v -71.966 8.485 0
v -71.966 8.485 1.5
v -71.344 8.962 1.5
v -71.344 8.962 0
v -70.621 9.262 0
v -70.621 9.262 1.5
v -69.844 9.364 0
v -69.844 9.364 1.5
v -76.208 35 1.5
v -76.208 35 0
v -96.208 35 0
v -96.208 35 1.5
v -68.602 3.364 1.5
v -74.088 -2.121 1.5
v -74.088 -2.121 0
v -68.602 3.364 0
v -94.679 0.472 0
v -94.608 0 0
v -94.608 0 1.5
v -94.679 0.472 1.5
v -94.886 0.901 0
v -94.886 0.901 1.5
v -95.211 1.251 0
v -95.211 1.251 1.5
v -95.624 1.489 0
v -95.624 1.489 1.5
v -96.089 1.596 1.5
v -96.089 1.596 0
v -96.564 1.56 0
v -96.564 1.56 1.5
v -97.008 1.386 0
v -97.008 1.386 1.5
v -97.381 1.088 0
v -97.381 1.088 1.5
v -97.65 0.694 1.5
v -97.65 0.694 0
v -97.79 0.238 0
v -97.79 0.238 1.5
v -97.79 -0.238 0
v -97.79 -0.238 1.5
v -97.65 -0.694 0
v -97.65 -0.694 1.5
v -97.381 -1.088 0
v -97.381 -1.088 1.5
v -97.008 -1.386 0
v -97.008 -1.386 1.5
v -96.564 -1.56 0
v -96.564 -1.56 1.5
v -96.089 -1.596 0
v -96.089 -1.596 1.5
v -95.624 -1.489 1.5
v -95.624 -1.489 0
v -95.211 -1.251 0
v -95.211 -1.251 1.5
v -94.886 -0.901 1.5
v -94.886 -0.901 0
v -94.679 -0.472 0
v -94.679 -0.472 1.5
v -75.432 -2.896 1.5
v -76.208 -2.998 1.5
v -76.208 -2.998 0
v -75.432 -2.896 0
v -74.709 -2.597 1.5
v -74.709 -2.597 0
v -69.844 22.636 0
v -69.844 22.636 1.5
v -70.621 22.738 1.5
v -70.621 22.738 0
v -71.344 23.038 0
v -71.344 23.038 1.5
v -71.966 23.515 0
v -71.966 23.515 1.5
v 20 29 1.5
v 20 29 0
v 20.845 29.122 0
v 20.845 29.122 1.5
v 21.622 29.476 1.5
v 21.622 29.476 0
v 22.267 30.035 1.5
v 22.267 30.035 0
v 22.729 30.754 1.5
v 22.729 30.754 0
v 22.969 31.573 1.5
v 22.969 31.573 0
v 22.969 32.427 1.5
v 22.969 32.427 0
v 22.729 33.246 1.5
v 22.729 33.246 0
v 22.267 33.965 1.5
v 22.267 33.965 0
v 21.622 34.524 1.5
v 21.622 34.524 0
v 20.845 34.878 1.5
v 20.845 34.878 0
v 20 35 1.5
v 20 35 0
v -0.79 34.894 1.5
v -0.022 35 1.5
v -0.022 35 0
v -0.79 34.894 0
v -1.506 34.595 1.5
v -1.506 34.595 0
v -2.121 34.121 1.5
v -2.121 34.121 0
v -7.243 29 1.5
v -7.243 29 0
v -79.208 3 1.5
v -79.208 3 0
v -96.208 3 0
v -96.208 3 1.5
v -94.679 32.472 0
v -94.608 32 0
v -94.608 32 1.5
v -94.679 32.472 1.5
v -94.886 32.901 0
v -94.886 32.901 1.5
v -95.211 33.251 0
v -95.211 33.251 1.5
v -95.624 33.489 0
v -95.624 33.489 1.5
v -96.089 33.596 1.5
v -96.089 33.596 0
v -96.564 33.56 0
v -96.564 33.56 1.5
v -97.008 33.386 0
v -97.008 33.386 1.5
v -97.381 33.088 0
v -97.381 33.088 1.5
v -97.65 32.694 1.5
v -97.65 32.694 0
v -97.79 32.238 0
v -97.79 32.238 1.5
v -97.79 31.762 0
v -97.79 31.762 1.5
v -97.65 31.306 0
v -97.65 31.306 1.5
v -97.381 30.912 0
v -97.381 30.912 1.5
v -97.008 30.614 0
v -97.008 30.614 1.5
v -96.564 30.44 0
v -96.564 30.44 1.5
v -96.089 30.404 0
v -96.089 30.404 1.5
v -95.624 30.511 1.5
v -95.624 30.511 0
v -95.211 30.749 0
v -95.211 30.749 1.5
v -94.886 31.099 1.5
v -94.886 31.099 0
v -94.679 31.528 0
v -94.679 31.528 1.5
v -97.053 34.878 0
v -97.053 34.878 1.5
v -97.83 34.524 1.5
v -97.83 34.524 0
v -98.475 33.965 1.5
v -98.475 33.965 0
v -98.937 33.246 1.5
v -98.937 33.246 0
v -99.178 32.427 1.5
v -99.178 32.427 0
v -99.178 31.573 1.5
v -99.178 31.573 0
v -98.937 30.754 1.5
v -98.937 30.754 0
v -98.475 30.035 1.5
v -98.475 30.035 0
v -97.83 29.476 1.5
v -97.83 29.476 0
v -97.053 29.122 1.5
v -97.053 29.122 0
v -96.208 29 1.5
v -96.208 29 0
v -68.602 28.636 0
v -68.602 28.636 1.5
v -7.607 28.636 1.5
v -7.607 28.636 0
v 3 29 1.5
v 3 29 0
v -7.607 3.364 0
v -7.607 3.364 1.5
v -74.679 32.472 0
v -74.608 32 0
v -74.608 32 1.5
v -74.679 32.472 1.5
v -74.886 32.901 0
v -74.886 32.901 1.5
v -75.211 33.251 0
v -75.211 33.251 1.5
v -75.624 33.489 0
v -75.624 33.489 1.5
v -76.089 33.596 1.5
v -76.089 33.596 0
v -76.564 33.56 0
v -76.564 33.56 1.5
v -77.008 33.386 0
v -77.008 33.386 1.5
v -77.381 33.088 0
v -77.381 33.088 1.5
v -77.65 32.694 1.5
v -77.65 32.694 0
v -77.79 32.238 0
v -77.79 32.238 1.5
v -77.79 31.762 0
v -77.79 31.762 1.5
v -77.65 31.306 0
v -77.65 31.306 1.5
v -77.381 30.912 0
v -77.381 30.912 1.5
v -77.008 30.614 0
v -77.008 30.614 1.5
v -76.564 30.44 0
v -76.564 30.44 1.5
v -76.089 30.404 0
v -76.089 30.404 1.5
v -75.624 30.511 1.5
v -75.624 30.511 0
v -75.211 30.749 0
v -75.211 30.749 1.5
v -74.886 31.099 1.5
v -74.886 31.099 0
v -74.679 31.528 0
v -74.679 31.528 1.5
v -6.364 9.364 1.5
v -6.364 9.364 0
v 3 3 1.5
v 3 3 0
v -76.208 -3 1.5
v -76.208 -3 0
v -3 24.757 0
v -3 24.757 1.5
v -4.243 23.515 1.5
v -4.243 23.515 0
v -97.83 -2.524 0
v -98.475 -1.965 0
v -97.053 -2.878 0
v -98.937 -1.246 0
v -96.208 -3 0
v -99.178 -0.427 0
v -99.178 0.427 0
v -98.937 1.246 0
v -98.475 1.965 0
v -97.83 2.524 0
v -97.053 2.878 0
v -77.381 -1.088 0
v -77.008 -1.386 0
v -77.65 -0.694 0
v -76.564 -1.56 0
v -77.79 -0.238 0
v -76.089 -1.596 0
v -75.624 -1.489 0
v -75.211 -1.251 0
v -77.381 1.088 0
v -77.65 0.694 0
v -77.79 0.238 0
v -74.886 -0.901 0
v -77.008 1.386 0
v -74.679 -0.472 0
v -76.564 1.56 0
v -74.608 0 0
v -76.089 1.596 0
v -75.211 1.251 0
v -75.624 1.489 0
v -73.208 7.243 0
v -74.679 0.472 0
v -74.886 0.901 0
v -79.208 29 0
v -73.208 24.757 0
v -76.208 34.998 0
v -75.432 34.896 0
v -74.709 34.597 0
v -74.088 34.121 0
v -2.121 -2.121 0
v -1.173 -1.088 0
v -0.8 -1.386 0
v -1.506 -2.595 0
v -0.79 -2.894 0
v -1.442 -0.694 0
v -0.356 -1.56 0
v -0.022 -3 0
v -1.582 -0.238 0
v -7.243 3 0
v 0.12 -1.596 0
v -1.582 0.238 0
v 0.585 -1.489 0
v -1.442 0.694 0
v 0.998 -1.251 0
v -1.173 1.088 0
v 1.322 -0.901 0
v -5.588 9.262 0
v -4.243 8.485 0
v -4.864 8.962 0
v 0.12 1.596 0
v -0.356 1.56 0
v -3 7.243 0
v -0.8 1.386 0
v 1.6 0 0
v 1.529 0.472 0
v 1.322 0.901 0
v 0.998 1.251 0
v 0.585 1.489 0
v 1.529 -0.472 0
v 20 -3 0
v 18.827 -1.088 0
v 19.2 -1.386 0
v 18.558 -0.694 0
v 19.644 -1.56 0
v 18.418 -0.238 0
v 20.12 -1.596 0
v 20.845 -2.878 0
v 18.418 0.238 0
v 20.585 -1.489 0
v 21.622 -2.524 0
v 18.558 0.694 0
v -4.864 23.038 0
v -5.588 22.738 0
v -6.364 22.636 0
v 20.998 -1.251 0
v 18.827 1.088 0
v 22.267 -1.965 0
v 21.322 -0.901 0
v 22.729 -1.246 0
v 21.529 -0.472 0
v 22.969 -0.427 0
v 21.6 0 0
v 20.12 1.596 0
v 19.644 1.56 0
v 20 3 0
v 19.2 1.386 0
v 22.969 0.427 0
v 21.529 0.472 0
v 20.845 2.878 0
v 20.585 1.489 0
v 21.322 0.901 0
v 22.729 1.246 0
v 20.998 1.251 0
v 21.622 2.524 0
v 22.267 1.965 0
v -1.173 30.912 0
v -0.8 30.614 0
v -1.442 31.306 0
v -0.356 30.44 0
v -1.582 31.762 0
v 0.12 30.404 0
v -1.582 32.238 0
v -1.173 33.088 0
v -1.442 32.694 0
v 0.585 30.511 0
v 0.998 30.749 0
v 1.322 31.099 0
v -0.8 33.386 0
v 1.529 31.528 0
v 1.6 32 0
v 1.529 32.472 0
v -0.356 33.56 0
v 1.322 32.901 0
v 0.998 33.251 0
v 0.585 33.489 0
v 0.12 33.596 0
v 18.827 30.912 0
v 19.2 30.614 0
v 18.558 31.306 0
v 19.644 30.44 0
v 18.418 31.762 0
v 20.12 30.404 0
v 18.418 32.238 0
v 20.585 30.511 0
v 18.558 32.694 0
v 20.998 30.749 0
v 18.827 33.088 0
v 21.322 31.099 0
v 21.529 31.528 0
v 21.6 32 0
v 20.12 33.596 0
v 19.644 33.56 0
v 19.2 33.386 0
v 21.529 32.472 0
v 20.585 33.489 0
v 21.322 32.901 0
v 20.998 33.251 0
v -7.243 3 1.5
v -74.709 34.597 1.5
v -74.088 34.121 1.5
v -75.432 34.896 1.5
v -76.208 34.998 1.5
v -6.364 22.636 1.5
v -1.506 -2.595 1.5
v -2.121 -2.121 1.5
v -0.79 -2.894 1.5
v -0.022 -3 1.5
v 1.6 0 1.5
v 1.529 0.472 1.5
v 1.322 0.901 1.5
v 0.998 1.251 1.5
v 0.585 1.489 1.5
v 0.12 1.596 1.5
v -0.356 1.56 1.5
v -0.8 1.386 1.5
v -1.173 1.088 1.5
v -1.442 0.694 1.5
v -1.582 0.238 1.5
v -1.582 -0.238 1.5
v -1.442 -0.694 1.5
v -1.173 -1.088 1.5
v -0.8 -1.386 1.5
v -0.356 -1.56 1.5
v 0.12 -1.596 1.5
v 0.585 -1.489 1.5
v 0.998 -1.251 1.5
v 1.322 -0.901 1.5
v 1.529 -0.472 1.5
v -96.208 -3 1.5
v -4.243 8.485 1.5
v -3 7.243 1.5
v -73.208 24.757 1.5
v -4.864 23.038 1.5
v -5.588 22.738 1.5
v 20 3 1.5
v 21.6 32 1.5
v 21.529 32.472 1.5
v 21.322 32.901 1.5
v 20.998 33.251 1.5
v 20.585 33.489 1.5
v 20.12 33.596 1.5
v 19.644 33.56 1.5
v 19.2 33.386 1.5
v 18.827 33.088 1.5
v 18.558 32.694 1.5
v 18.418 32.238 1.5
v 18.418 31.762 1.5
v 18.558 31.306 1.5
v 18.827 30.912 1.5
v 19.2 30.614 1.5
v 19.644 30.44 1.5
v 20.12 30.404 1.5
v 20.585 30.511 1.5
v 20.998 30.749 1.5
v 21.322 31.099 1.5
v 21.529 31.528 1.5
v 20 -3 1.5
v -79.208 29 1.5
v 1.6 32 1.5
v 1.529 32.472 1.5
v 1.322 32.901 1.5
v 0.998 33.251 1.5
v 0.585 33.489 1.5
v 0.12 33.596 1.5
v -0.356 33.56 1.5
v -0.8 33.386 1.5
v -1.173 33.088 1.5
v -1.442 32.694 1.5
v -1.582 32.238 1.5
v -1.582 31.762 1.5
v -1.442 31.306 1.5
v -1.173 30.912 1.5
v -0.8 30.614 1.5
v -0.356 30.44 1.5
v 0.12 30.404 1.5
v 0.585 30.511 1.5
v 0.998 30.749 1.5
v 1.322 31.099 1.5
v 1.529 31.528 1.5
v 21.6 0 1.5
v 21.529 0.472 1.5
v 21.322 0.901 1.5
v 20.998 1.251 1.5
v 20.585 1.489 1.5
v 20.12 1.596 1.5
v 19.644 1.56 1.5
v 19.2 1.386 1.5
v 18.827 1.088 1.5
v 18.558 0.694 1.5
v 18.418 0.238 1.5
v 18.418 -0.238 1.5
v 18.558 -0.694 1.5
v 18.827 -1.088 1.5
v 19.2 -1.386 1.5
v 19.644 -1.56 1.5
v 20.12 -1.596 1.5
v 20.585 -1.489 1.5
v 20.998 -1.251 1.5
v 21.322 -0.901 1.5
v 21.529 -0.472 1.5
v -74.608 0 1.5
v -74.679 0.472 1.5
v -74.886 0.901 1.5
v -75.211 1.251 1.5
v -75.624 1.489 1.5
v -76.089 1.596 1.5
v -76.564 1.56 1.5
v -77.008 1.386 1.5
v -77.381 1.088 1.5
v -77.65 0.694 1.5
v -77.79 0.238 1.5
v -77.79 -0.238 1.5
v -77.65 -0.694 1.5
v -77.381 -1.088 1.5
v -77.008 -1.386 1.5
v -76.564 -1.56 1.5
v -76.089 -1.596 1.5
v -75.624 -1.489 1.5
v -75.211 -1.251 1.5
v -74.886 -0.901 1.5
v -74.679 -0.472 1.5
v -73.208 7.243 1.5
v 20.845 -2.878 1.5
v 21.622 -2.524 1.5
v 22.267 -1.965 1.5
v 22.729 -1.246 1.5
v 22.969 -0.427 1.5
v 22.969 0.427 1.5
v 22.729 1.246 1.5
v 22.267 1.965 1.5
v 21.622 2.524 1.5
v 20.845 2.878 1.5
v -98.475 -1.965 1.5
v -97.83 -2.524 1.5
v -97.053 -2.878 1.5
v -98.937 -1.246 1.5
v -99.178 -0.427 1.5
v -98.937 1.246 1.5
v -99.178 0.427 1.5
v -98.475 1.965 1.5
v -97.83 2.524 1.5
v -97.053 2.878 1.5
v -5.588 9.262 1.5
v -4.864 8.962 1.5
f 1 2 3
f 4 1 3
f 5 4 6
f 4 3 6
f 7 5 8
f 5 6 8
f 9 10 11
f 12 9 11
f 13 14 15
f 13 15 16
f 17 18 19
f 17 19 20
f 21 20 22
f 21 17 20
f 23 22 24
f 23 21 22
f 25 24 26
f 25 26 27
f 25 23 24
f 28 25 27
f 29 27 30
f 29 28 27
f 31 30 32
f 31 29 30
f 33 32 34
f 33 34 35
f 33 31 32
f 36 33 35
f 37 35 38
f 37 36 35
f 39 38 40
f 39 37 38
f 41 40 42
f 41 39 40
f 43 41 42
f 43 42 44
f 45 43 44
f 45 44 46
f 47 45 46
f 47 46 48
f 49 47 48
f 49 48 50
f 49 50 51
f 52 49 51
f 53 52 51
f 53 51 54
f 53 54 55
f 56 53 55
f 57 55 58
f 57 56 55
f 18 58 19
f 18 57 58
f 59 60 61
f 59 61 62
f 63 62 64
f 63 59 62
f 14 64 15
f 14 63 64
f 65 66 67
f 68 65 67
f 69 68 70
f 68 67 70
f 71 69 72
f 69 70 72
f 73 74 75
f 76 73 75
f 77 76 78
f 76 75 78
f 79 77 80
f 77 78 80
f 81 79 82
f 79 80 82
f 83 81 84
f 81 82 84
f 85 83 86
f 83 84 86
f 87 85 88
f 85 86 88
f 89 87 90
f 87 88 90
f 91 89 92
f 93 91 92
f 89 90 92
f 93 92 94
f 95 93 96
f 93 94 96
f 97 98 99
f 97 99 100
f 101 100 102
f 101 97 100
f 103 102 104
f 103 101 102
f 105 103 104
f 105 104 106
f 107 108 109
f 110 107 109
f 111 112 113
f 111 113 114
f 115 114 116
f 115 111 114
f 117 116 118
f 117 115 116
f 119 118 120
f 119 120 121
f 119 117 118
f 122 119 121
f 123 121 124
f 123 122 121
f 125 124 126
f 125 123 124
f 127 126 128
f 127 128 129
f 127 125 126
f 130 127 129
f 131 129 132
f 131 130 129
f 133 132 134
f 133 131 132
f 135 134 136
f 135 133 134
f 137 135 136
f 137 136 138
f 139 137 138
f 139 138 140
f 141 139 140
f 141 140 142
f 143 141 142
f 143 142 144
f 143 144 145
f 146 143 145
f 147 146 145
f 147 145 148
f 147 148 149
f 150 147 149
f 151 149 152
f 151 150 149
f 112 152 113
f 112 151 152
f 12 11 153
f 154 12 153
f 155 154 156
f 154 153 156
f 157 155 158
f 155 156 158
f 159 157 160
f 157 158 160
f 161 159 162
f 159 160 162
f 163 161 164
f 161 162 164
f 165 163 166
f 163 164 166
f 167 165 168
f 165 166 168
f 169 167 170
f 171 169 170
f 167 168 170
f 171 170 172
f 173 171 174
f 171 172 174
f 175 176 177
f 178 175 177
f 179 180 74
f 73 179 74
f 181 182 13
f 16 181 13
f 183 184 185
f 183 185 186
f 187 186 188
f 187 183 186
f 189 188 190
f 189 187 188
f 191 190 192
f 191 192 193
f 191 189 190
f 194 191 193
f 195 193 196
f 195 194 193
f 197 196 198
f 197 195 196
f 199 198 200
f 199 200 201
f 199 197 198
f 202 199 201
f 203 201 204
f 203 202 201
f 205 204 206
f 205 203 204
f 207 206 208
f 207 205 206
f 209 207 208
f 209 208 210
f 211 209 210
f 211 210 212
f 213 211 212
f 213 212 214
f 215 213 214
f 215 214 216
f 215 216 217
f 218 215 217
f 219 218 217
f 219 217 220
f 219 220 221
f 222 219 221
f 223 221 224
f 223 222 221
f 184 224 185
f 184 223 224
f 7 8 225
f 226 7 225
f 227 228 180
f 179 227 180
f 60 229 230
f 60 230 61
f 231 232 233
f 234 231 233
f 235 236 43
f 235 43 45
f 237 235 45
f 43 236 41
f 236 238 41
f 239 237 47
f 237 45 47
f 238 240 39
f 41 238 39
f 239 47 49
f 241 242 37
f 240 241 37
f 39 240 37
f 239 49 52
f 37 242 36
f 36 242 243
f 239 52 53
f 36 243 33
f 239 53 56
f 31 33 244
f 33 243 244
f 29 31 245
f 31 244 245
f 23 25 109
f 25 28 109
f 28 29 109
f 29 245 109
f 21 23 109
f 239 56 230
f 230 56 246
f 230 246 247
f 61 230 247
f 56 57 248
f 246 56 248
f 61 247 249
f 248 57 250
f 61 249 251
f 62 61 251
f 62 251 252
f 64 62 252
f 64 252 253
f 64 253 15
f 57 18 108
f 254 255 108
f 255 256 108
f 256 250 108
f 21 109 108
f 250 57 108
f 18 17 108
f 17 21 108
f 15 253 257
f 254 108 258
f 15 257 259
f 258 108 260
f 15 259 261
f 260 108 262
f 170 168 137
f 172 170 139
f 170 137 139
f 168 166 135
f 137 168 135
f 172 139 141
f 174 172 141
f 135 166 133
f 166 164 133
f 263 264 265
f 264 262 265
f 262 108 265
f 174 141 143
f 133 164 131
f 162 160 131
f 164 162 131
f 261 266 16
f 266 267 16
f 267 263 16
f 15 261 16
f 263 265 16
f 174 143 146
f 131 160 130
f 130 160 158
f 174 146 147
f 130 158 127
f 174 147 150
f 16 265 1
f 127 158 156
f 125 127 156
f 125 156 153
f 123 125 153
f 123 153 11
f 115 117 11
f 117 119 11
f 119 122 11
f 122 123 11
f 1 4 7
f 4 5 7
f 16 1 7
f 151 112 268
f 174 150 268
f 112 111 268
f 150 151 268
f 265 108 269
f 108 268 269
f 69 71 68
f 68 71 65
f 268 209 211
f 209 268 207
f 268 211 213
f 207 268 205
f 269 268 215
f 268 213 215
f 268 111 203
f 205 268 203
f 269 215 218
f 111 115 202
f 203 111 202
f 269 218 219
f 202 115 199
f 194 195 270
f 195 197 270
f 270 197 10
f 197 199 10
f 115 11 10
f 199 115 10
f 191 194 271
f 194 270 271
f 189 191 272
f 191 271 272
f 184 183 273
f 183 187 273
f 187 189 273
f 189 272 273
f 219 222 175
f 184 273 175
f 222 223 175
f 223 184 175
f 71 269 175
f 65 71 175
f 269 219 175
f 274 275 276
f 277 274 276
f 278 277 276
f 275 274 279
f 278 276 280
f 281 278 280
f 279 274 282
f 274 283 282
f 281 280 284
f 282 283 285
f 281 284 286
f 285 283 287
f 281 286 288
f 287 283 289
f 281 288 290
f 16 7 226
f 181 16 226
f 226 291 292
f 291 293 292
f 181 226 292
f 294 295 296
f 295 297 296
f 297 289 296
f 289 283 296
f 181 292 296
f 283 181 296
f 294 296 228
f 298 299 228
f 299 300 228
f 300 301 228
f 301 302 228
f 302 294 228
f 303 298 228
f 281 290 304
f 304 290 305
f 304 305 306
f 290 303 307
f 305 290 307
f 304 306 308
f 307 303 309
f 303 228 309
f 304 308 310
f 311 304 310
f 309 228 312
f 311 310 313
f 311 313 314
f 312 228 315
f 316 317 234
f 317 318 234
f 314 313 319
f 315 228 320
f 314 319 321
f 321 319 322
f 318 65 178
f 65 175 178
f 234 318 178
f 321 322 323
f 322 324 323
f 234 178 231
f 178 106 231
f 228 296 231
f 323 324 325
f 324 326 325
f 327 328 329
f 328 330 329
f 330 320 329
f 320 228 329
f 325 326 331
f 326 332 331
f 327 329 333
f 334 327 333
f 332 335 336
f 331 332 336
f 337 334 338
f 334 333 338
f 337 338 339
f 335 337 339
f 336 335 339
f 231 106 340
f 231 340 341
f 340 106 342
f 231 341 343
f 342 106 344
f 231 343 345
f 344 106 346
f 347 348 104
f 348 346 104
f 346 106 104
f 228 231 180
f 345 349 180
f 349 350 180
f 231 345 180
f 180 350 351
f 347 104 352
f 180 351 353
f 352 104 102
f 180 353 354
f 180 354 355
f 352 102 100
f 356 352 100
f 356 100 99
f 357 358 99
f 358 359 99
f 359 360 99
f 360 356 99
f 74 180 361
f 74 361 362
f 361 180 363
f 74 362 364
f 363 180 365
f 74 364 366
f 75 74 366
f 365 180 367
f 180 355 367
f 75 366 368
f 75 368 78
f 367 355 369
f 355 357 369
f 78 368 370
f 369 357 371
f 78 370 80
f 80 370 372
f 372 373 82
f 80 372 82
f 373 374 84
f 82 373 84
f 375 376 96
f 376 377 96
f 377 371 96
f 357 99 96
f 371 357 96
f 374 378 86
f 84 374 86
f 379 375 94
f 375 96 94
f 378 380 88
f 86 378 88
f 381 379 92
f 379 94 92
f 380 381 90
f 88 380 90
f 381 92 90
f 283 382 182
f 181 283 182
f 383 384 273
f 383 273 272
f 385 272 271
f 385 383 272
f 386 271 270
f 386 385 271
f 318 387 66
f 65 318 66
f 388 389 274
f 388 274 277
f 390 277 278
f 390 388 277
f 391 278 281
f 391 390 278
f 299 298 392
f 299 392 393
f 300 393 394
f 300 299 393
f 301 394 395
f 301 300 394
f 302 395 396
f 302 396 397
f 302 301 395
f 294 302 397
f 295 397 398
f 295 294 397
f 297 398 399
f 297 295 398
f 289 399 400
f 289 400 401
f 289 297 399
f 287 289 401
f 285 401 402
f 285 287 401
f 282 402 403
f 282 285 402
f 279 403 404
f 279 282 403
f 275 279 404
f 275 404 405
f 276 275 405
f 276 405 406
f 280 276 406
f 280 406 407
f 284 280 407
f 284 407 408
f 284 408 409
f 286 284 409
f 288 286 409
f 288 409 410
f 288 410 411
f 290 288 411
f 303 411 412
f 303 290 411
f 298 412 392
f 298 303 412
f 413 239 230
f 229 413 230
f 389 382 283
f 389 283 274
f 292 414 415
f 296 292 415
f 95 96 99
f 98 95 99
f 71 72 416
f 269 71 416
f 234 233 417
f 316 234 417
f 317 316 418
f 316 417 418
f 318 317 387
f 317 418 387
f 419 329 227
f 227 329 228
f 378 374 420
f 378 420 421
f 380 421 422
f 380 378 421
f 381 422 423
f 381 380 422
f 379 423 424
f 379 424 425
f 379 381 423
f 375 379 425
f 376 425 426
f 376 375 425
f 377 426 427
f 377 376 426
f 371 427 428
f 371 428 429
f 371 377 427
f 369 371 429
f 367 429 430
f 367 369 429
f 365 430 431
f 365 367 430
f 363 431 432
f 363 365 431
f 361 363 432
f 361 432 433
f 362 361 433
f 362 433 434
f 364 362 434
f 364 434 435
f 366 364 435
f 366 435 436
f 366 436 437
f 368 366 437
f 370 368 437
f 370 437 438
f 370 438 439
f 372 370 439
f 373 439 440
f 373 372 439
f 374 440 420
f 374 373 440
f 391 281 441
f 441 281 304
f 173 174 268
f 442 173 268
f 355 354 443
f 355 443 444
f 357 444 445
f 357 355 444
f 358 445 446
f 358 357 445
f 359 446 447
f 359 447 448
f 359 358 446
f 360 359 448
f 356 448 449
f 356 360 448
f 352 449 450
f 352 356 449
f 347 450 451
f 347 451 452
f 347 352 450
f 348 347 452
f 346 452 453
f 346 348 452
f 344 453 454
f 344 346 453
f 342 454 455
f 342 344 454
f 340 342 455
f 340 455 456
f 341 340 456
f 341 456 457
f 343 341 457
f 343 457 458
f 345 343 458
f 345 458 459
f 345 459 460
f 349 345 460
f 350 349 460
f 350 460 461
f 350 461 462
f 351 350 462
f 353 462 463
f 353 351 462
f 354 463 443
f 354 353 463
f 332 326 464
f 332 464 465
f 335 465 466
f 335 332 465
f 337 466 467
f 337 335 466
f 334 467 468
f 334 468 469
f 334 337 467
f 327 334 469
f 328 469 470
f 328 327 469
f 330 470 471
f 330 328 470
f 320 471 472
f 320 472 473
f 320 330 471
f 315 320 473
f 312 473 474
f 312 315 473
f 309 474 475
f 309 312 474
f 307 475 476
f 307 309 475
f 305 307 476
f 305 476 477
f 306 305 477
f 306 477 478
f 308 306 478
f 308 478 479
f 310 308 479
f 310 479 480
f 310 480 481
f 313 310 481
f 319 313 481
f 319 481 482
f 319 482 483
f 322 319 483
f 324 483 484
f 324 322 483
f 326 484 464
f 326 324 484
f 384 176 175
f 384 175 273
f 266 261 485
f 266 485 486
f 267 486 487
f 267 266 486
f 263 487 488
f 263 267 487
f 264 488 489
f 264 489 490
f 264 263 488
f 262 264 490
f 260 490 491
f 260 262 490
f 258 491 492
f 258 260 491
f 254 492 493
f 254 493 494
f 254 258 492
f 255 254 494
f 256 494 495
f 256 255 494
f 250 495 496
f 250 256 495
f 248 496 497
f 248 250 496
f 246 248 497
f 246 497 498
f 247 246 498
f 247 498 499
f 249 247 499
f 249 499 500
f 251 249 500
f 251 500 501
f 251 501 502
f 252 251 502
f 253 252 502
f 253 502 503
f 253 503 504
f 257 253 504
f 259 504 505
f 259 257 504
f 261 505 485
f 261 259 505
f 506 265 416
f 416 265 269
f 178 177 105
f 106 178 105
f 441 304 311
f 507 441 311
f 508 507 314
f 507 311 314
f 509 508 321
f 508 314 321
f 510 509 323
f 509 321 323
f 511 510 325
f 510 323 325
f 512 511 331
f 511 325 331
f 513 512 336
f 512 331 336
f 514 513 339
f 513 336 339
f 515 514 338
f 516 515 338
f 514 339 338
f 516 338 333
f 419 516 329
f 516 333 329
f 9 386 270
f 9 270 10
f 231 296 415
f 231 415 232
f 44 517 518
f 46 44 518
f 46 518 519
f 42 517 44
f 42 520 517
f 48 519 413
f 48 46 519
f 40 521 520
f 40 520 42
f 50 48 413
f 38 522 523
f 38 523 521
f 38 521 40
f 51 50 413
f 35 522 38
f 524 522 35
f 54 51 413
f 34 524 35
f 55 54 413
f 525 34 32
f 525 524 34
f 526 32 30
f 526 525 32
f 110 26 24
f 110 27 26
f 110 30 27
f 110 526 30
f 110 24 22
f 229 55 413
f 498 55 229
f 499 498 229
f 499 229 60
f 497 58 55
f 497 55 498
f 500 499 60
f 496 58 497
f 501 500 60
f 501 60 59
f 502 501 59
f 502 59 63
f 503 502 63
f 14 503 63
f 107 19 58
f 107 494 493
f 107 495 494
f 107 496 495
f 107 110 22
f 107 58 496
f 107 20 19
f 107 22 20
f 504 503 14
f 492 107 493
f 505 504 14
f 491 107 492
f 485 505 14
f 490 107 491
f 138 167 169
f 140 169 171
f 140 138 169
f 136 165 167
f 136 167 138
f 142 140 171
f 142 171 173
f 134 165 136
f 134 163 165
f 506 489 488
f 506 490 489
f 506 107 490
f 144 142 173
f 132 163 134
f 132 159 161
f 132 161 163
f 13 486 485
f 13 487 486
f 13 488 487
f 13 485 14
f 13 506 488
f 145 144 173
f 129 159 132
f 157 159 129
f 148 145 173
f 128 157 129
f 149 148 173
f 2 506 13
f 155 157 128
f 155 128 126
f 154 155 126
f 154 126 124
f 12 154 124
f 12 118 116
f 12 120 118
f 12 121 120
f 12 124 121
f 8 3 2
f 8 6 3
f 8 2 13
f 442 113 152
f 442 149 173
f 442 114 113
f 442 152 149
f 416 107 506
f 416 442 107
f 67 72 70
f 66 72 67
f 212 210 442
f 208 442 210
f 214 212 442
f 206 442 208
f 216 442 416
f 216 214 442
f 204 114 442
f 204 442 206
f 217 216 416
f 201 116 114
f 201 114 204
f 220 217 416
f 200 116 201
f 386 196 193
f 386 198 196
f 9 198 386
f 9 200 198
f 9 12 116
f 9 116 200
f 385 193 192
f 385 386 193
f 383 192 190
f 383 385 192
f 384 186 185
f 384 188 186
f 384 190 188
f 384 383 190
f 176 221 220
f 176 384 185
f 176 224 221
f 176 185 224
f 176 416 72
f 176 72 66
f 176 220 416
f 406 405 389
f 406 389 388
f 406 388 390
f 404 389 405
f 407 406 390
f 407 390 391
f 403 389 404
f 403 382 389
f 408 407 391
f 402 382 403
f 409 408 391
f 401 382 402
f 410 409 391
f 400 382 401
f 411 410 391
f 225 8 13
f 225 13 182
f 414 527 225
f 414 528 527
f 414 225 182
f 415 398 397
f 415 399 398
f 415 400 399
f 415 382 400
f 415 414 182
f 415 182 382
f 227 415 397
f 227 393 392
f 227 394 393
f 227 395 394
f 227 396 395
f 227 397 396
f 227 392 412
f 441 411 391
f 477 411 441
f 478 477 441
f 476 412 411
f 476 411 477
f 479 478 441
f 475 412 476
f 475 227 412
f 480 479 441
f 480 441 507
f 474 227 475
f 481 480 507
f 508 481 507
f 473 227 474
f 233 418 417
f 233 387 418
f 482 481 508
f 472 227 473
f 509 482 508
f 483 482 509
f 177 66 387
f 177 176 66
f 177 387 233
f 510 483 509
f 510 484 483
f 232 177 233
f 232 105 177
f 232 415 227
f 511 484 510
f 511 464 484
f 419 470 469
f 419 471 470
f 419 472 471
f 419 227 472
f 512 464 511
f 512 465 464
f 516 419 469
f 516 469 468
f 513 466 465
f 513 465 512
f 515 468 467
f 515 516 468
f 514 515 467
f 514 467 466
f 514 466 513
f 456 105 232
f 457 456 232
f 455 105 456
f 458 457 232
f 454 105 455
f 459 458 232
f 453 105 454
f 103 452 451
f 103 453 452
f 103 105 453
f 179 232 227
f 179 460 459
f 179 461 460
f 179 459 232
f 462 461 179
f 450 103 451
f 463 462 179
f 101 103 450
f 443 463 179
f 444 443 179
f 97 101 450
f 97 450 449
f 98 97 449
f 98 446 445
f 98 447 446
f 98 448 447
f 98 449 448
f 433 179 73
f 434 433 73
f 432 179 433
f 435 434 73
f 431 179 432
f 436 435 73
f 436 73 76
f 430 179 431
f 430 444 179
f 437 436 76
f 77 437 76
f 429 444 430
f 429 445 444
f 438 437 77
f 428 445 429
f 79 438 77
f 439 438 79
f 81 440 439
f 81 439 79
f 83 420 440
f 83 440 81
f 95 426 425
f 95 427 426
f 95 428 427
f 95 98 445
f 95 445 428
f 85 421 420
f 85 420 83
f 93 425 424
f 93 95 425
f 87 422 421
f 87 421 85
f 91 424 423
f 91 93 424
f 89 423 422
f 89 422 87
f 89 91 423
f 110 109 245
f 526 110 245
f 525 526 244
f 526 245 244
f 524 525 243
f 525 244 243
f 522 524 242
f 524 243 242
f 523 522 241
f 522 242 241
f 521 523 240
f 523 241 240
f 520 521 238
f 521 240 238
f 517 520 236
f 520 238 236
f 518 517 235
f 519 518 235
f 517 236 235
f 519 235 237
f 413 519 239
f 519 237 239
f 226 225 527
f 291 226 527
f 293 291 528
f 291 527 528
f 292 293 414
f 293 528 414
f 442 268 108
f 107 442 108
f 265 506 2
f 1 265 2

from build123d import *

# Parameters (mm, degrees)
SKETCH1_R           = 1.6
SKETCH1_W           = 70.2081528
SKETCH1_H           = 26
BOSS_EXTRUDE1_DEPTH = 1.5
SKETCH2_R           = 1.6
BOSS_EXTRUDE2_DEPTH = 1.5
CUT_EXTRUDE1_DEPTH  = 1.5


with BuildPart() as part:
    # Sketch1 → Boss-Extrude1 (new body)
    with BuildSketch(Plane.XY):
        with BuildLine():
            Line((0, -3), (20, -3))
            ThreePointArc((20, -3), (23, 0), (20, 3))
            Line((20, 3), (3, 3))
            Line((3, 3), (3, 13))
            Line((3, 13), (3, 29))
            Line((3, 29), (20, 29))
            ThreePointArc((20, 29), (23, 32), (20, 35))
            Line((20, 35), (0, 35))
            Line((0, 35), (-76.2081528, 35))
            Line((-76.2081528, 35), (-96.2081528, 35))
            ThreePointArc((-96.2081528, 35), (-99.2081528, 32), (-96.2081528, 29))
            Line((-96.2081528, 29), (-79.2081528, 29))
            Line((-79.2081528, 29), (-79.2081528, 14.5))
            Line((-79.2081528, 14.5), (-79.2081528, 3))
            Line((-79.2081528, 3), (-96.2081528, 3))
            ThreePointArc((-96.2081528, 3), (-99.2081528, 0), (-96.2081528, -3))
            Line((-96.2081528, -3), (-76.2081528, -3))
            Line((-76.2081528, -3), (0, -3))
        make_face()
        with Locations((-76.2081528, 0)):
            Circle(SKETCH1_R, mode=Mode.SUBTRACT)
        with Locations((-76.2081528, 32)):
            Circle(SKETCH1_R, mode=Mode.SUBTRACT)
        Circle(SKETCH1_R, mode=Mode.SUBTRACT)
        with Locations((20, 0)):
            Circle(SKETCH1_R, mode=Mode.SUBTRACT)
        with Locations((0, 32)):
            Circle(SKETCH1_R, mode=Mode.SUBTRACT)
        with Locations((20, 32)):
            Circle(SKETCH1_R, mode=Mode.SUBTRACT)
        with Locations((-96.2081528, 32)):
            Circle(SKETCH1_R, mode=Mode.SUBTRACT)
        with Locations((-96.2081528, 0)):
            Circle(SKETCH1_R, mode=Mode.SUBTRACT)
        with Locations((-38.1040764, 16)):
            Rectangle(SKETCH1_W, SKETCH1_H, mode=Mode.SUBTRACT)
    extrude(amount=BOSS_EXTRUDE1_DEPTH)

    # Sketch2 → Boss-Extrude2 (add)
    with BuildSketch(Plane.XY.offset(1.5)):
        with BuildLine():
            Line((-74.086832456, 34.121320344), (-68.601551082, 28.636038969))
            Line((-68.601551082, 28.636038969), (-7.606601718, 28.636038969))
            Line((-7.606601718, 28.636038969), (-2.121320344, 34.121320344))
            ThreePointArc((-2.121320344, 34.121320344), (2.121320344, 34.121320344), (2.121320344, 29.878679656))
            Line((2.121320344, 29.878679656), (-4.242640687, 23.514718626))
            ThreePointArc((-4.242640687, 23.514718626), (-5.215910734, 22.864400372), (-6.363961031, 22.636038969))
            Line((-6.363961031, 22.636038969), (-69.844191769, 22.636038969))
            ThreePointArc((-69.844191769, 22.636038969), (-70.992242066, 22.864400372), (-71.965512113, 23.514718626))
            Line((-71.965512113, 23.514718626), (-78.329473144, 29.878679656))
            ThreePointArc((-78.329473144, 29.878679656), (-78.329473144, 34.121320344), (-74.086832456, 34.121320344))
        make_face()
        with Locations((0, 32)):
            Circle(SKETCH2_R, mode=Mode.SUBTRACT)
        with Locations((-76.2081528, 32)):
            Circle(SKETCH2_R, mode=Mode.SUBTRACT)
        with BuildLine():
            Line((-69.844191769, 9.363961031), (-6.363961031, 9.363961031))
            ThreePointArc((-6.363961031, 9.363961031), (-5.215910734, 9.135599628), (-4.242640687, 8.485281374))
            Line((-4.242640687, 8.485281374), (2.121320344, 2.121320344))
            ThreePointArc((2.121320344, 2.121320344), (2.121320344, -2.121320344), (-2.121320344, -2.121320344))
            Line((-2.121320344, -2.121320344), (-7.606601718, 3.363961031))
            Line((-7.606601718, 3.363961031), (-68.601551082, 3.363961031))
            Line((-68.601551082, 3.363961031), (-74.086832456, -2.121320344))
            ThreePointArc((-74.086832456, -2.121320344), (-78.329473144, -2.121320344), (-78.329473144, 2.121320344))
            Line((-78.329473144, 2.121320344), (-71.965512113, 8.485281374))
            ThreePointArc((-71.965512113, 8.485281374), (-70.992242066, 9.135599628), (-69.844191769, 9.363961031))
        make_face()
        with Locations((-76.2081528, 0)):
            Circle(SKETCH2_R, mode=Mode.SUBTRACT)
        Circle(SKETCH2_R, mode=Mode.SUBTRACT)
    extrude(amount=-BOSS_EXTRUDE2_DEPTH)

    # Sketch3 → Cut-Extrude1 (cut)
    with BuildSketch(Plane.XY.offset(1.5)):
        with BuildLine():
            Line((-68.601551082, 28.636038969), (-74.088420945, 34.12061745))
            ThreePointArc((-74.088420945, 34.12061745), (-75.061011799, 34.770261546), (-76.2081528, 34.998379814))
            Line((-76.2081528, 34.998379814), (-76.2081528, 40.296736943))
            Line((-76.2081528, 40.296736943), (0, 40.296736943))
            Line((0, 40.296736943), (0, 35.000078273))
            ThreePointArc((0, 35.000078273), (-1.148094234, 34.77170512), (-2.121397096, 34.121354286))
            Line((-2.121397096, 34.121354286), (-7.606601718, 28.636038969))
            Line((-7.606601718, 28.636038969), (-68.601551082, 28.636038969))
        make_face()
        with BuildLine():
            Line((-76.2081528, -8.296736943), (-76.2081528, -2.998379814))
            ThreePointArc((-76.2081528, -2.998379814), (-75.061011799, -2.770261546), (-74.088420945, -2.12061745))
            Line((-74.088420945, -2.12061745), (-68.601551082, 3.363961031))
            Line((-68.601551082, 3.363961031), (-7.606601718, 3.363961031))
            Line((-7.606601718, 3.363961031), (-2.121397096, -2.121354286))
            ThreePointArc((-2.121397096, -2.121354286), (-1.148094234, -2.77170512), (0, -3.000078273))
            Line((0, -3.000078273), (0, -8.296736943))
            Line((0, -8.296736943), (-76.2081528, -8.296736943))
        make_face()
    extrude(amount=-CUT_EXTRUDE1_DEPTH, mode=Mode.SUBTRACT)


solid = part.part
